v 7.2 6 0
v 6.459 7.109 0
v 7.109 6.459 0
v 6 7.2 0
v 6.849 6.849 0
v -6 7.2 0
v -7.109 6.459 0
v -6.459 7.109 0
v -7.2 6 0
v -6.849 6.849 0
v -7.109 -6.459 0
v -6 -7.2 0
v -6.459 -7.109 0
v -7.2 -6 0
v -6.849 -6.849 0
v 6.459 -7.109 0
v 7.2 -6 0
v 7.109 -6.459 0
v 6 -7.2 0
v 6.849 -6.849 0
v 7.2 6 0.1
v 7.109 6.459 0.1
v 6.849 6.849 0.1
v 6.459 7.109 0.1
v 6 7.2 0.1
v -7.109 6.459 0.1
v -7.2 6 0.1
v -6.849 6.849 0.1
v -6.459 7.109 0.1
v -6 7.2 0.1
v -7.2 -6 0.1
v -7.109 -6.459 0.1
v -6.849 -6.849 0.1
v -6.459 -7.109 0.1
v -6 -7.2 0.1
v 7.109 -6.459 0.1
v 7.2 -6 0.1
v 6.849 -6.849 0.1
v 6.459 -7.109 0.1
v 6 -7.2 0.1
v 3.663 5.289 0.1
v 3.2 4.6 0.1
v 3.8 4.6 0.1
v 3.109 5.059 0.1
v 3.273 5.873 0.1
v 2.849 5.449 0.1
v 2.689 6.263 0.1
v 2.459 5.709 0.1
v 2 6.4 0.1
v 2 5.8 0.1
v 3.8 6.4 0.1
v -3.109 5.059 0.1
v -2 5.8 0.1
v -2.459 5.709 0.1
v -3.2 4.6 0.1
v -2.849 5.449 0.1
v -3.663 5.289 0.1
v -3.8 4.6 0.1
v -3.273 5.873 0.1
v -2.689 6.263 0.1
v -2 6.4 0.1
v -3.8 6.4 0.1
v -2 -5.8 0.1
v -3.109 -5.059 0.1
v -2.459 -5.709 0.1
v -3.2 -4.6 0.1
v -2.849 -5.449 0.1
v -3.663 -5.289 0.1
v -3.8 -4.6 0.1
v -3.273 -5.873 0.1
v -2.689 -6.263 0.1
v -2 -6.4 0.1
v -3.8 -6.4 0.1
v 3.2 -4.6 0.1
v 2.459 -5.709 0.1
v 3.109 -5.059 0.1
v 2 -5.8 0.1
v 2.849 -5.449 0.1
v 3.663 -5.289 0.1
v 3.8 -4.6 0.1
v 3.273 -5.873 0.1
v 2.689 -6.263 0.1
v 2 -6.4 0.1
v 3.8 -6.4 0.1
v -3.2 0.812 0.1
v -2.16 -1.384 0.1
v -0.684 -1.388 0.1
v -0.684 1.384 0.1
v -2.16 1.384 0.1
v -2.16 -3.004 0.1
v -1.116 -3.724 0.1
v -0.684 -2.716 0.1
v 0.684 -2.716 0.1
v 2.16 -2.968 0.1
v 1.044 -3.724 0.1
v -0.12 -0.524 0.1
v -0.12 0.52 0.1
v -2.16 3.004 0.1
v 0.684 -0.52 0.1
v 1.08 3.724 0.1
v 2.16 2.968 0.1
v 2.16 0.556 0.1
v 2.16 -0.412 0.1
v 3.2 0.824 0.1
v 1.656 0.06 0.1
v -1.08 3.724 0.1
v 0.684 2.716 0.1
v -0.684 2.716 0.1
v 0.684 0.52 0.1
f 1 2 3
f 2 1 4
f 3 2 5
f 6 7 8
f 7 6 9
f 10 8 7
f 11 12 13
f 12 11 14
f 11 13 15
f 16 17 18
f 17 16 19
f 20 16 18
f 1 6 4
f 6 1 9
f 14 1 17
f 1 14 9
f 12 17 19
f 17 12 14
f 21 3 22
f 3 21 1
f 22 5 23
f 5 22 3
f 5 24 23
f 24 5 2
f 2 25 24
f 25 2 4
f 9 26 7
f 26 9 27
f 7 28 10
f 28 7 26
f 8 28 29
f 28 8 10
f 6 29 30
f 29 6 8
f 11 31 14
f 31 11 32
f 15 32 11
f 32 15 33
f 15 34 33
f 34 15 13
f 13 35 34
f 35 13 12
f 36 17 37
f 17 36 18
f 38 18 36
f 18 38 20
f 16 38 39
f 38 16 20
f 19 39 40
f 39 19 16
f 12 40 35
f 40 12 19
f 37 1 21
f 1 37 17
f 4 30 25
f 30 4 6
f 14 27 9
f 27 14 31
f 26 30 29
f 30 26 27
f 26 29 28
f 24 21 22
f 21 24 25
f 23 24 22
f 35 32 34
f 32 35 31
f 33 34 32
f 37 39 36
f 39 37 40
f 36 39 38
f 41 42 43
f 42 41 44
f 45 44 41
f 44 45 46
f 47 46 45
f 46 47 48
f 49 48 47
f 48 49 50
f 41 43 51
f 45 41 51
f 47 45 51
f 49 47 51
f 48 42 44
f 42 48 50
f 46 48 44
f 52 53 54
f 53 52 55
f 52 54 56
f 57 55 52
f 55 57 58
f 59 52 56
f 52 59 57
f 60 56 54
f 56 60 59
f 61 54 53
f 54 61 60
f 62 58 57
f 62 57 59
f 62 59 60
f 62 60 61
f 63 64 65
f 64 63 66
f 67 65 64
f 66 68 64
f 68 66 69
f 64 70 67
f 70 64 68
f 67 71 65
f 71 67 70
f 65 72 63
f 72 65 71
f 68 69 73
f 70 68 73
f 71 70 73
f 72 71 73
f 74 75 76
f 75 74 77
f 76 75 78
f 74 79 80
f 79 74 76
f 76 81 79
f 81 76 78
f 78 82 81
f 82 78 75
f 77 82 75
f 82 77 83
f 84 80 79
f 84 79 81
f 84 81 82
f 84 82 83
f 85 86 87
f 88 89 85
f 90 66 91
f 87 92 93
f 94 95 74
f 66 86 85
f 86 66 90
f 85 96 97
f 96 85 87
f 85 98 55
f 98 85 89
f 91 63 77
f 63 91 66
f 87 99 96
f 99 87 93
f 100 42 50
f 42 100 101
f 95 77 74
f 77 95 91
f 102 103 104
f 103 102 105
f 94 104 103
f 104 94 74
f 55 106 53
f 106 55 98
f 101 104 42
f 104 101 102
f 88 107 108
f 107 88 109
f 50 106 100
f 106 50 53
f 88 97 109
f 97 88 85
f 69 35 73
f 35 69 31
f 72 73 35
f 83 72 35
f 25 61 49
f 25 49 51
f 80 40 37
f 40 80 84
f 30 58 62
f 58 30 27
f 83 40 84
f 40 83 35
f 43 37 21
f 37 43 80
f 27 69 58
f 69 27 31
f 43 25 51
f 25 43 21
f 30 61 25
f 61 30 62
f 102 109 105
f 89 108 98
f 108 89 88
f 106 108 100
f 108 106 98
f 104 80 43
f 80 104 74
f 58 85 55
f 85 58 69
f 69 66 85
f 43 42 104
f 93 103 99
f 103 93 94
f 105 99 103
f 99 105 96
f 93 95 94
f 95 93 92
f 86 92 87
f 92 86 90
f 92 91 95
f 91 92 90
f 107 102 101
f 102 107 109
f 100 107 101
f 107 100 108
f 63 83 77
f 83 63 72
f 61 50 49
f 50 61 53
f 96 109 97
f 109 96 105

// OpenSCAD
// file: ../p/1-4cyli.scad
use <../lib.scad>
function ldraw_lib__1_4cyli() = [
// 0 Cylinder 0.25
// 0 Name: 1-4cyli.dat
// 0 Author: James Jessiman
// 0 !LDRAW_ORG Primitive UPDATE 2012-01
// 0 !LICENSE Licensed under CC BY 4.0 : see CAreadme.txt
// 
// 0 BFC CERTIFY CCW
  [0,"BFC","CERTIFY"],
  [0,"BFC","CCW"],
// 
// 0 !HISTORY 2002-03-23 [sbliss] Added BFC statement.
// 0 !HISTORY 2002-04-25 [PTadmin] Official Update 2002-02
// 0 !HISTORY 2007-06-22 [PTadmin] Header formatted for Contributor Agreement
// 0 !HISTORY 2008-07-01 [PTadmin] Official Update 2008-01
// 0 !HISTORY 2012-02-16 [Philo] Changed to CCW
// 0 !HISTORY 2012-03-30 [PTadmin] Official Update 2012-01
// 
// 
// 4 16 1 1 0 0.9239 1 0.3827 0.9239 0 0.3827 1 0 0
  [4,16,1,1,0,0.9239,1,0.3827,0.9239,0,0.3827,1,0,0],
// 5 24 1 0 0 1 1 0 0.9239 0 0.3827 1 0 -1
  [5,24,1,0,0,1,1,0,0.9239,0,0.3827,1,0,-1],
// 4 16 0.9239 1 0.3827 0.7071 1 0.7071 0.7071 0 0.7071 0.9239 0 0.3827
  [4,16,0.9239,1,0.3827,0.7071,1,0.7071,0.7071,0,0.7071,0.9239,0,0.3827],
// 5 24 0.9239 0 0.3827 0.9239 1 0.3827 0.7071 0 0.7071 1 0 0
  [5,24,0.9239,0,0.3827,0.9239,1,0.3827,0.7071,0,0.7071,1,0,0],
// 4 16 0.7071 1 0.7071 0.3827 1 0.9239 0.3827 0 0.9239 0.7071 0 0.7071
  [4,16,0.7071,1,0.7071,0.3827,1,0.9239,0.3827,0,0.9239,0.7071,0,0.7071],
// 5 24 0.7071 0 0.7071 0.7071 1 0.7071 0.3827 0 0.9239 0.9239 0 0.3827
  [5,24,0.7071,0,0.7071,0.7071,1,0.7071,0.3827,0,0.9239,0.9239,0,0.3827],
// 4 16 0.3827 1 0.9239 0 1 1 0 0 1 0.3827 0 0.9239
  [4,16,0.3827,1,0.9239,0,1,1,0,0,1,0.3827,0,0.9239],
// 5 24 0.3827 0 0.9239 0.3827 1 0.9239 0 0 1 0.7071 0 0.7071
  [5,24,0.3827,0,0.9239,0.3827,1,0.9239,0,0,1,0.7071,0,0.7071],
// 5 24 0 0 1 0 1 1 0.3827 0 0.9239 -1 0 1
  [5,24,0,0,1,0,1,1,0.3827,0,0.9239,-1,0,1],
];
module ldraw_lib__1_4cyli(step=0, col=false, unit=2/5, alt=false, line=0.2, solid=!$preview)
    makepoly(ldraw_lib__1_4cyli(), step=step, col=col, unit=unit, alt=alt, line=line, solid=solid);
ldraw_lib__1_4cyli(line=0.2);
// file: s/6237277as01.scad
use <../../lib.scad>
use <../../p/1-4chrd.scad>
use <../../p/1-4cyli.scad>
function ldraw_lib__s__6237277as01() = [
// 0 ~Sticker  1.8 x  1.8 without Top Surface
// 0 Name: s\6237277as01.dat
// 0 Author: Alex Herrera [alanbrito98]
// 0 !LDRAW_ORG Subpart UPDATE 2023-04
// 0 !LICENSE Licensed under CC BY 4.0 : see CAreadme.txt
// 
// 0 BFC CERTIFY CCW
  [0,"BFC","CERTIFY"],
  [0,"BFC","CCW"],
// 
// 0 !HISTORY 2023-08-25 [OrionP] Official Update 2023-04
// 
// 
// 0 // Bottom
// 0 // Primitives
// 1 16 15 0 15 3 0 0 0 -1 0 0 0 3 1-4chrd.dat
  [1,16,15,0,15,3,0,0,0,-1,0,0,0,3, ldraw_lib__1_4chrd()],
// 1 16 -15 0 15 -3 0 0 0 -1 0 0 0 3 1-4chrd.dat
  [1,16,-15,0,15,-3,0,0,0,-1,0,0,0,3, ldraw_lib__1_4chrd()],
// 1 16 -15 0 -15 -3 0 0 0 -1 0 0 0 -3 1-4chrd.dat
  [1,16,-15,0,-15,-3,0,0,0,-1,0,0,0,-3, ldraw_lib__1_4chrd()],
// 1 16 15 0 -15 3 0 0 0 -1 0 0 0 -3 1-4chrd.dat
  [1,16,15,0,-15,3,0,0,0,-1,0,0,0,-3, ldraw_lib__1_4chrd()],
// 0 // Bottom Faces
// 4 16 18 0 15 -18 0 15 -15 0 18 15 0 18
  [4,16,18,0,15,-18,0,15,-15,0,18,15,0,18],
// 4 16 -18 0 -15 -18 0 15 18 0 15 18 0 -15
  [4,16,-18,0,-15,-18,0,15,18,0,15,18,0,-15],
// 4 16 15 0 -18 -15 0 -18 -18 0 -15 18 0 -15
  [4,16,15,0,-18,-15,0,-18,-18,0,-15,18,0,-15],
// 0 // Sides
// 0 // Primitives
// 1 16 15 0 15 3 0 0 0 -0.25 0 0 0 3 1-4cyli.dat
  [1,16,15,0,15,3,0,0,0,-0.25,0,0,0,3, ldraw_lib__1_4cyli()],
// 1 16 -15 0 15 -3 0 0 0 -0.25 0 0 0 3 1-4cyli.dat
  [1,16,-15,0,15,-3,0,0,0,-0.25,0,0,0,3, ldraw_lib__1_4cyli()],
// 1 16 -15 0 -15 -3 0 0 0 -0.25 0 0 0 -3 1-4cyli.dat
  [1,16,-15,0,-15,-3,0,0,0,-0.25,0,0,0,-3, ldraw_lib__1_4cyli()],
// 1 16 15 0 -15 3 0 0 0 -0.25 0 0 0 -3 1-4cyli.dat
  [1,16,15,0,-15,3,0,0,0,-0.25,0,0,0,-3, ldraw_lib__1_4cyli()],
// 0 // Side Faces
// 4 16 -15 0 -18 15 0 -18 15 -0.25 -18 -15 -0.25 -18
  [4,16,-15,0,-18,15,0,-18,15,-0.25,-18,-15,-0.25,-18],
// 4 16 18 0 -15 18 0 15 18 -0.25 15 18 -0.25 -15
  [4,16,18,0,-15,18,0,15,18,-0.25,15,18,-0.25,-15],
// 4 16 15 0 18 -15 0 18 -15 -0.25 18 15 -0.25 18
  [4,16,15,0,18,-15,0,18,-15,-0.25,18,15,-0.25,18],
// 4 16 -18 0 15 -18 0 -15 -18 -0.25 -15 -18 -0.25 15
  [4,16,-18,0,15,-18,0,-15,-18,-0.25,-15,-18,-0.25,15],
// 
];
module ldraw_lib__s__6237277as01(step=0, col=false, unit=2/5, alt=false, line=0.2, solid=!$preview)
    makepoly(ldraw_lib__s__6237277as01(), step=step, col=col, unit=unit, alt=alt, line=line, solid=solid);
ldraw_lib__s__6237277as01(line=0.2);
// file: ../p/1-4ring2.scad
use <../lib.scad>
function ldraw_lib__1_4ring2() = [
// 0 Ring  2 x 0.25
// 0 Name: 1-4ring2.dat
// 0 Author: Franklin W. Cain [fwcain]
// 0 !LDRAW_ORG Primitive UPDATE 2015-01
// 0 !LICENSE Licensed under CC BY 4.0 : see CAreadme.txt
// 
// 0 BFC CERTIFY CCW
  [0,"BFC","CERTIFY"],
  [0,"BFC","CCW"],
// 
// 0 !HISTORY 2001-12-31 [PTadmin] Official Update 2001-03
// 0 !HISTORY 2007-06-22 [PTadmin] Header formatted for Contributor Agreement
// 0 !HISTORY 2008-07-01 [PTadmin] Official Update 2008-01
// 0 !HISTORY 2012-02-16 [Philo] Changed to CCW
// 0 !HISTORY 2012-03-30 [PTadmin] Official Update 2012-01
// 0 !HISTORY 2014-12-25 [MMR1988] Fixed a rounding issue
// 0 !HISTORY 2015-10-11 [PTadmin] Official Update 2015-01
// 
// 
// 4 16 3 0 0 2.7717 0 1.1481 1.8478 0 0.7654 2 0 0
  [4,16,3,0,0,2.7717,0,1.1481,1.8478,0,0.7654,2,0,0],
// 4 16 2.7717 0 1.1481 2.1213 0 2.1213 1.4142 0 1.4142 1.8478 0 0.7654
  [4,16,2.7717,0,1.1481,2.1213,0,2.1213,1.4142,0,1.4142,1.8478,0,0.7654],
// 4 16 2.1213 0 2.1213 1.1481 0 2.7717 0.7654 0 1.8478 1.4142 0 1.4142
  [4,16,2.1213,0,2.1213,1.1481,0,2.7717,0.7654,0,1.8478,1.4142,0,1.4142],
// 4 16 1.1481 0 2.7717 0 0 3 0 0 2 0.7654 0 1.8478
  [4,16,1.1481,0,2.7717,0,0,3,0,0,2,0.7654,0,1.8478],
// 0 // Build by Primitive Generator 2
];
module ldraw_lib__1_4ring2(step=0, col=false, unit=2/5, alt=false, line=0.2, solid=!$preview)
    makepoly(ldraw_lib__1_4ring2(), step=step, col=col, unit=unit, alt=alt, line=line, solid=solid);
ldraw_lib__1_4ring2(line=0.2);
// file: ../p/1-4ndis.scad
use <../lib.scad>
function ldraw_lib__1_4ndis() = [
// 0 Disc Negative 0.25
// 0 Name: 1-4ndis.dat
// 0 Author: James Jessiman
// 0 !LDRAW_ORG Primitive UPDATE 2012-01
// 0 !LICENSE Licensed under CC BY 4.0 : see CAreadme.txt
// 
// 0 BFC CERTIFY CCW
  [0,"BFC","CERTIFY"],
  [0,"BFC","CCW"],
// 
// 0 !HISTORY 2002-03-23 [sbliss] Added BFC Statement
// 0 !HISTORY 2002-04-25 [PTadmin] Official Update 2002-02
// 0 !HISTORY 2007-06-22 [PTadmin] Header formatted for Contributor Agreement
// 0 !HISTORY 2008-07-01 [PTadmin] Official Update 2008-01
// 0 !HISTORY 2012-02-16 [Philo] Changed to CCW
// 0 !HISTORY 2012-03-30 [PTadmin] Official Update 2012-01
// 
// 
// 3 16 0.9239 0 0.3827 1 0 0 1 0 1
  [3,16,0.9239,0,0.3827,1,0,0,1,0,1],
// 3 16 0.7071 0 0.7071 0.9239 0 0.3827 1 0 1
  [3,16,0.7071,0,0.7071,0.9239,0,0.3827,1,0,1],
// 3 16 0.3827 0 0.9239 0.7071 0 0.7071 1 0 1
  [3,16,0.3827,0,0.9239,0.7071,0,0.7071,1,0,1],
// 3 16 0 0 1 0.3827 0 0.9239 1 0 1
  [3,16,0,0,1,0.3827,0,0.9239,1,0,1],
];
module ldraw_lib__1_4ndis(step=0, col=false, unit=2/5, alt=false, line=0.2, solid=!$preview)
    makepoly(ldraw_lib__1_4ndis(), step=step, col=col, unit=unit, alt=alt, line=line, solid=solid);
ldraw_lib__1_4ndis(line=0.2);
// file: ../p/1-4chrd.scad
use <../lib.scad>
function ldraw_lib__1_4chrd() = [
// 0 Chord 0.25
// 0 Name: 1-4chrd.dat
// 0 Author: Max Martin Richter [MMR1988]
// 0 !LDRAW_ORG Primitive UPDATE 2023-05
// 0 !LICENSE Licensed under CC BY 4.0 : see CAreadme.txt
// 
// 0 BFC CERTIFY CCW
  [0,"BFC","CERTIFY"],
  [0,"BFC","CCW"],
// 
// 0 !HISTORY 2004-04-22 [PTadmin] Official Update 2004-02
// 0 !HISTORY 2007-10-09 [PTadmin] Header formatted for Contributor Agreement
// 0 !HISTORY 2008-07-01 [PTadmin] Official Update 2008-01
// 0 !HISTORY 2012-08-02 [MMR1988] Re-creation with PrimGen2 and Rectifier
// 0 !HISTORY 2012-08-09 [PTadmin] Official Update 2012-02
// 0 !HISTORY 2023-10-27 [OrionP] Change author to MMR1988 from hafhead
// 0 !HISTORY 2023-10-31 [OrionP] Official Update 2023-05
// 
// 4 16 0.9239 0 0.3827 0.3827 0 0.9239 0 0 1 1 0 0
  [4,16,0.9239,0,0.3827,0.3827,0,0.9239,0,0,1,1,0,0],
// 3 16 0.7071 0 0.7071 0.3827 0 0.9239 0.9239 0 0.3827
  [3,16,0.7071,0,0.7071,0.3827,0,0.9239,0.9239,0,0.3827],
];
module ldraw_lib__1_4chrd(step=0, col=false, unit=2/5, alt=false, line=0.2, solid=!$preview)
    makepoly(ldraw_lib__1_4chrd(), step=step, col=col, unit=unit, alt=alt, line=line, solid=solid);
ldraw_lib__1_4chrd(line=0.2);
// main file
use <../lib.scad>
use <../p/1-4chrd.scad>
use <../p/1-4ndis.scad>
use <../p/1-4ring2.scad>
use <s/6237277as01.scad>
function ldraw_lib__6237277c() = [
// 0 Sticker  1.8 x  1.8 with Yellow "3" on Black Panel on Red Background
// 0 Name: 6237277c.dat
// 0 Author: Alex Herrera [alanbrito98]
// 0 !LDRAW_ORG Part UPDATE 2024-03
// 0 !LICENSE Licensed under CC BY 4.0 : see CAreadme.txt
// 
// 0 BFC CERTIFY CCW
  [0,"BFC","CERTIFY"],
  [0,"BFC","CCW"],
// 
// 0 !KEYWORDS Bricklink 21311stk01, Brickowl 227694, Rebrickable 39754, set 21311
// 0 !KEYWORDS Voltron
// 
// 0 !HISTORY 2021-11-30 [MagFors] centered the digit
// 0 !HISTORY 2024-04-28 [OrionP] Official Update 2024-03
// 
// 
// 0 // Box
// 
// 1 16 0 0 0 1 0 0 0 1 0 0 0 1 s\6237277as01.dat
  [1,16,0,0,0,1,0,0,0,1,0,0,0,1, ldraw_lib__s__6237277as01()],
// 0 // Pattern
// 0 // Primitives
// 1 4 -15 -0.25 15 -3 0 0 0 1 0 0 0 3 1-4chrd.dat
  [1,4,-15,-0.25,15,-3,0,0,0,1,0,0,0,3, ldraw_lib__1_4chrd()],
// 1 4 15 -0.25 15 3 0 0 0 1 0 0 0 3 1-4chrd.dat
  [1,4,15,-0.25,15,3,0,0,0,1,0,0,0,3, ldraw_lib__1_4chrd()],
// 1 4 -15 -0.25 -15 -3 0 0 0 1 0 0 0 -3 1-4chrd.dat
  [1,4,-15,-0.25,-15,-3,0,0,0,1,0,0,0,-3, ldraw_lib__1_4chrd()],
// 1 4 15 -0.25 -15 3 0 0 0 1 0 0 0 -3 1-4chrd.dat
  [1,4,15,-0.25,-15,3,0,0,0,1,0,0,0,-3, ldraw_lib__1_4chrd()],
// 1 14 5 -0.25 11.5 1.5 0 0 0 1 0 0 0 1.5 1-4ring2.dat
  [1,14,5,-0.25,11.5,1.5,0,0,0,1,0,0,0,1.5, ldraw_lib__1_4ring2()],
// 1 4 5 -0.25 11.5 4.5 0 0 0 1 0 0 0 4.5 1-4ndis.dat
  [1,4,5,-0.25,11.5,4.5,0,0,0,1,0,0,0,4.5, ldraw_lib__1_4ndis()],
// 1 0 5 -0.25 11.5 3 0 0 0 1 0 0 0 3 1-4chrd.dat
  [1,0,5,-0.25,11.5,3,0,0,0,1,0,0,0,3, ldraw_lib__1_4chrd()],
// 1 0 -5 -0.25 11.5 -3 0 0 0 1 0 0 0 3 1-4chrd.dat
  [1,0,-5,-0.25,11.5,-3,0,0,0,1,0,0,0,3, ldraw_lib__1_4chrd()],
// 1 14 -5 -0.25 11.5 -1.5 0 0 0 1 0 0 0 1.5 1-4ring2.dat
  [1,14,-5,-0.25,11.5,-1.5,0,0,0,1,0,0,0,1.5, ldraw_lib__1_4ring2()],
// 1 4 -5 -0.25 11.5 -4.5 0 0 0 1 0 0 0 4.5 1-4ndis.dat
  [1,4,-5,-0.25,11.5,-4.5,0,0,0,1,0,0,0,4.5, ldraw_lib__1_4ndis()],
// 1 0 -5 -0.25 -11.5 -3 0 0 0 1 0 0 0 -3 1-4chrd.dat
  [1,0,-5,-0.25,-11.5,-3,0,0,0,1,0,0,0,-3, ldraw_lib__1_4chrd()],
// 1 14 -5 -0.25 -11.5 -1.5 0 0 0 1 0 0 0 -1.5 1-4ring2.dat
  [1,14,-5,-0.25,-11.5,-1.5,0,0,0,1,0,0,0,-1.5, ldraw_lib__1_4ring2()],
// 1 4 -5 -0.25 -11.5 -4.5 0 0 0 1 0 0 0 -4.5 1-4ndis.dat
  [1,4,-5,-0.25,-11.5,-4.5,0,0,0,1,0,0,0,-4.5, ldraw_lib__1_4ndis()],
// 1 0 5 -0.25 -11.5 3 0 0 0 1 0 0 0 -3 1-4chrd.dat
  [1,0,5,-0.25,-11.5,3,0,0,0,1,0,0,0,-3, ldraw_lib__1_4chrd()],
// 1 14 5 -0.25 -11.5 1.5 0 0 0 1 0 0 0 -1.5 1-4ring2.dat
  [1,14,5,-0.25,-11.5,1.5,0,0,0,1,0,0,0,-1.5, ldraw_lib__1_4ring2()],
// 1 4 5 -0.25 -11.5 4.5 0 0 0 1 0 0 0 -4.5 1-4ndis.dat
  [1,4,5,-0.25,-11.5,4.5,0,0,0,1,0,0,0,-4.5, ldraw_lib__1_4ndis()],
// 0 // Black
// 3 0 -8 -.25 2.03 -5.4 -.25 -3.46 -1.71 -.25 -3.47
  [3,0,-8,-.25,2.03,-5.4,-.25,-3.46,-1.71,-.25,-3.47],
// 3 0 -1.71 -.25 3.46 -5.4 -.25 3.46 -8 -.25 2.03
  [3,0,-1.71,-.25,3.46,-5.4,-.25,3.46,-8,-.25,2.03],
// 3 0 -5.4 -.25 -7.51 -8 -.25 -11.5 -2.79 -.25 -9.31
  [3,0,-5.4,-.25,-7.51,-8,-.25,-11.5,-2.79,-.25,-9.31],
// 3 0 -1.71 -.25 -3.47 -1.71 -.25 -6.79 1.71 -.25 -6.79
  [3,0,-1.71,-.25,-3.47,-1.71,-.25,-6.79,1.71,-.25,-6.79],
// 3 0 5.4 -.25 -7.42 2.61 -.25 -9.31 8 -.25 -11.5
  [3,0,5.4,-.25,-7.42,2.61,-.25,-9.31,8,-.25,-11.5],
// 4 0 -8 -.25 -11.5 -5.4 -.25 -7.51 -5.4 -.25 -3.46 -8 -.25 2.03
  [4,0,-8,-.25,-11.5,-5.4,-.25,-7.51,-5.4,-.25,-3.46,-8,-.25,2.03],
// 4 0 -.3 -.25 -1.31 -.3 -.25 1.3 -8 -.25 2.03 -1.71 -.25 -3.47
  [4,0,-.3,-.25,-1.31,-.3,-.25,1.3,-8,-.25,2.03,-1.71,-.25,-3.47],
// 4 0 -5.4 -.25 7.51 -8 -.25 11.5 -8 -.25 2.03 -5.4 -.25 3.46
  [4,0,-5.4,-.25,7.51,-8,-.25,11.5,-8,-.25,2.03,-5.4,-.25,3.46],
// 4 0 -2.79 -.25 -9.31 -8 -.25 -11.5 -5 -.25 -14.5 5 -.25 -14.5
  [4,0,-2.79,-.25,-9.31,-8,-.25,-11.5,-5,-.25,-14.5,5,-.25,-14.5],
// 4 0 1.71 -.25 -1.3 -.3 -.25 -1.31 -1.71 -.25 -3.47 1.71 -.25 -6.79
  [4,0,1.71,-.25,-1.3,-.3,-.25,-1.31,-1.71,-.25,-3.47,1.71,-.25,-6.79],
// 4 0 8 -.25 11.5 5 -.25 14.5 2.7 -.25 9.31 5.4 -.25 7.42
  [4,0,8,-.25,11.5,5,-.25,14.5,2.7,-.25,9.31,5.4,-.25,7.42],
// 4 0 8 -.25 -11.5 2.61 -.25 -9.31 -2.79 -.25 -9.31 5 -.25 -14.5
  [4,0,8,-.25,-11.5,2.61,-.25,-9.31,-2.79,-.25,-9.31,5,-.25,-14.5],
// 4 0 8 -.25 2.06 5.4 -.25 1.39 4.14 -.25 .15 5.4 -.25 -1.03
  [4,0,8,-.25,2.06,5.4,-.25,1.39,4.14,-.25,.15,5.4,-.25,-1.03],
// 4 0 8 -.25 2.06 5.4 -.25 -1.03 5.4 -.25 -7.42 8 -.25 -11.5
  [4,0,8,-.25,2.06,5.4,-.25,-1.03,5.4,-.25,-7.42,8,-.25,-11.5],
// 4 0 -8 -.25 11.5 -5.4 -.25 7.51 -2.7 -.25 9.31 -5 -.25 14.5
  [4,0,-8,-.25,11.5,-5.4,-.25,7.51,-2.7,-.25,9.31,-5,-.25,14.5],
// 4 0 8 -.25 2.06 8 -.25 11.5 5.4 -.25 7.42 5.4 -.25 1.39
  [4,0,8,-.25,2.06,8,-.25,11.5,5.4,-.25,7.42,5.4,-.25,1.39],
// 4 0 -1.71 -.25 3.46 1.71 -.25 1.3 1.71 -.25 6.79 -1.71 -.25 6.79
  [4,0,-1.71,-.25,3.46,1.71,-.25,1.3,1.71,-.25,6.79,-1.71,-.25,6.79],
// 4 0 -5 -.25 14.5 -2.7 -.25 9.31 2.7 -.25 9.31 5 -.25 14.5
  [4,0,-5,-.25,14.5,-2.7,-.25,9.31,2.7,-.25,9.31,5,-.25,14.5],
// 4 0 -1.71 -.25 3.46 -8 -.25 2.03 -.3 -.25 1.3 1.71 -.25 1.3
  [4,0,-1.71,-.25,3.46,-8,-.25,2.03,-.3,-.25,1.3,1.71,-.25,1.3],
// 0 // Red
// 4 4 -18 -.25 -15 -15 -.25 -18 -9.5 -.25 -16 -9.5 -.25 -11.5
  [4,4,-18,-.25,-15,-15,-.25,-18,-9.5,-.25,-16,-9.5,-.25,-11.5],
// 3 4 -5 -0.25 -16 -9.5 -0.25 -16 -15 -0.25 -18
  [3,4,-5,-0.25,-16,-9.5,-0.25,-16,-15,-0.25,-18],
// 3 4 5 -0.25 -16 -5 -0.25 -16 -15 -0.25 -18
  [3,4,5,-0.25,-16,-5,-0.25,-16,-15,-0.25,-18],
// 3 4 15 -0.25 18 -5 -0.25 16 5 -0.25 16
  [3,4,15,-0.25,18,-5,-0.25,16,5,-0.25,16],
// 3 4 15 -0.25 18 5 -0.25 16 9.5 -0.25 16
  [3,4,15,-0.25,18,5,-0.25,16,9.5,-0.25,16],
// 4 4 9.5 -0.25 -16 15 -0.25 -18 18 -0.25 -15 9.5 -0.25 -11.5
  [4,4,9.5,-0.25,-16,15,-0.25,-18,18,-0.25,-15,9.5,-0.25,-11.5],
// 4 4 -9.5 -0.25 16 -15 -0.25 18 -18 -0.25 15 -9.5 -0.25 11.5
  [4,4,-9.5,-0.25,16,-15,-0.25,18,-18,-0.25,15,-9.5,-0.25,11.5],
// 4 4 15 -0.25 -18 9.5 -0.25 -16 5 -0.25 -16 -15 -0.25 -18
  [4,4,15,-0.25,-18,9.5,-0.25,-16,5,-0.25,-16,-15,-0.25,-18],
// 4 4 9.5 -.25 -11.5 18 -.25 -15 18 -.25 15 9.5 -.25 11.5
  [4,4,9.5,-.25,-11.5,18,-.25,-15,18,-.25,15,9.5,-.25,11.5],
// 4 4 -9.5 -.25 -11.5 -9.5 -.25 11.5 -18 -.25 15 -18 -.25 -15
  [4,4,-9.5,-.25,-11.5,-9.5,-.25,11.5,-18,-.25,15,-18,-.25,-15],
// 4 4 18 -.25 15 15 -.25 18 9.5 -.25 16 9.5 -.25 11.5
  [4,4,18,-.25,15,15,-.25,18,9.5,-.25,16,9.5,-.25,11.5],
// 4 4 -15 -0.25 18 -9.5 -0.25 16 -5 -0.25 16 15 -0.25 18
  [4,4,-15,-0.25,18,-9.5,-0.25,16,-5,-0.25,16,15,-0.25,18],
// 0 // Yellow
// 3 14 5.4 -.25 1.39 1.71 -.25 1.3 4.14 -.25 .15
  [3,14,5.4,-.25,1.39,1.71,-.25,1.3,4.14,-.25,.15],
// 4 14 -5.4 -.25 7.51 -5.4 -.25 3.46 -1.71 -.25 3.46 -1.71 -.25 6.79
  [4,14,-5.4,-.25,7.51,-5.4,-.25,3.46,-1.71,-.25,3.46,-1.71,-.25,6.79],
// 4 14 -2.7 -.25 9.31 -5.4 -.25 7.51 -1.71 -.25 6.79 2.7 -.25 9.31
  [4,14,-2.7,-.25,9.31,-5.4,-.25,7.51,-1.71,-.25,6.79,2.7,-.25,9.31],
// 4 14 8 -.25 -11.5 9.5 -.25 -11.5 9.5 -.25 11.5 8 -.25 2.06
  [4,14,8,-.25,-11.5,9.5,-.25,-11.5,9.5,-.25,11.5,8,-.25,2.06],
// 4 14 -8 -.25 11.5 -9.5 -.25 11.5 -9.5 -.25 -11.5 -8 -.25 2.03
  [4,14,-8,-.25,11.5,-9.5,-.25,11.5,-9.5,-.25,-11.5,-8,-.25,2.03],
// 3 14 -9.5 -.25 -11.5 -8 -.25 -11.5 -8 -.25 2.03
  [3,14,-9.5,-.25,-11.5,-8,-.25,-11.5,-8,-.25,2.03],
// 3 14 9.5 -.25 11.5 8 -.25 11.5 8 -.25 2.06
  [3,14,9.5,-.25,11.5,8,-.25,11.5,8,-.25,2.06],
// 4 14 1.71 -.25 -1.3 1.71 -.25 -6.79 5.4 -.25 -7.42 5.4 -.25 -1.03
  [4,14,1.71,-.25,-1.3,1.71,-.25,-6.79,5.4,-.25,-7.42,5.4,-.25,-1.03],
// 4 14 1.71 -.25 -1.3 5.4 -.25 -1.03 4.14 -.25 .15 -.3 -.25 -1.31
  [4,14,1.71,-.25,-1.3,5.4,-.25,-1.03,4.14,-.25,.15,-.3,-.25,-1.31],
// 4 14 1.71 -.25 -6.79 -1.71 -.25 -6.79 2.61 -.25 -9.31 5.4 -.25 -7.42
  [4,14,1.71,-.25,-6.79,-1.71,-.25,-6.79,2.61,-.25,-9.31,5.4,-.25,-7.42],
// 4 14 -1.71 -.25 -3.47 -5.4 -.25 -3.46 -5.4 -.25 -7.51 -1.71 -.25 -6.79
  [4,14,-1.71,-.25,-3.47,-5.4,-.25,-3.46,-5.4,-.25,-7.51,-1.71,-.25,-6.79],
// 4 14 -1.71 -.25 -6.79 -5.4 -.25 -7.51 -2.79 -.25 -9.31 2.61 -.25 -9.31
  [4,14,-1.71,-.25,-6.79,-5.4,-.25,-7.51,-2.79,-.25,-9.31,2.61,-.25,-9.31],
// 4 14 5.4 -.25 7.42 1.71 -.25 6.79 1.71 -.25 1.3 5.4 -.25 1.39
  [4,14,5.4,-.25,7.42,1.71,-.25,6.79,1.71,-.25,1.3,5.4,-.25,1.39],
// 4 14 2.7 -.25 9.31 -1.71 -.25 6.79 1.71 -.25 6.79 5.4 -.25 7.42
  [4,14,2.7,-.25,9.31,-1.71,-.25,6.79,1.71,-.25,6.79,5.4,-.25,7.42],
// 4 14 5 -0.25 -14.5 -5 -0.25 -14.5 -5 -0.25 -16 5 -0.25 -16
  [4,14,5,-0.25,-14.5,-5,-0.25,-14.5,-5,-0.25,-16,5,-0.25,-16],
// 4 14 5 -0.25 14.5 5 -0.25 16 -5 -0.25 16 -5 -0.25 14.5
  [4,14,5,-0.25,14.5,5,-0.25,16,-5,-0.25,16,-5,-0.25,14.5],
// 4 14 4.14 -.25 .15 1.71 -.25 1.3 -.3 -.25 1.3 -.3 -.25 -1.31
  [4,14,4.14,-.25,.15,1.71,-.25,1.3,-.3,-.25,1.3,-.3,-.25,-1.31],
];
module ldraw_lib__6237277c(step=0, col=false, unit=2/5, alt=false, line=0.2, solid=!$preview)
    makepoly(ldraw_lib__6237277c(), step=step, col=col, unit=unit, alt=alt, line=line, solid=solid);
ldraw_lib__6237277c(line=0.2);
